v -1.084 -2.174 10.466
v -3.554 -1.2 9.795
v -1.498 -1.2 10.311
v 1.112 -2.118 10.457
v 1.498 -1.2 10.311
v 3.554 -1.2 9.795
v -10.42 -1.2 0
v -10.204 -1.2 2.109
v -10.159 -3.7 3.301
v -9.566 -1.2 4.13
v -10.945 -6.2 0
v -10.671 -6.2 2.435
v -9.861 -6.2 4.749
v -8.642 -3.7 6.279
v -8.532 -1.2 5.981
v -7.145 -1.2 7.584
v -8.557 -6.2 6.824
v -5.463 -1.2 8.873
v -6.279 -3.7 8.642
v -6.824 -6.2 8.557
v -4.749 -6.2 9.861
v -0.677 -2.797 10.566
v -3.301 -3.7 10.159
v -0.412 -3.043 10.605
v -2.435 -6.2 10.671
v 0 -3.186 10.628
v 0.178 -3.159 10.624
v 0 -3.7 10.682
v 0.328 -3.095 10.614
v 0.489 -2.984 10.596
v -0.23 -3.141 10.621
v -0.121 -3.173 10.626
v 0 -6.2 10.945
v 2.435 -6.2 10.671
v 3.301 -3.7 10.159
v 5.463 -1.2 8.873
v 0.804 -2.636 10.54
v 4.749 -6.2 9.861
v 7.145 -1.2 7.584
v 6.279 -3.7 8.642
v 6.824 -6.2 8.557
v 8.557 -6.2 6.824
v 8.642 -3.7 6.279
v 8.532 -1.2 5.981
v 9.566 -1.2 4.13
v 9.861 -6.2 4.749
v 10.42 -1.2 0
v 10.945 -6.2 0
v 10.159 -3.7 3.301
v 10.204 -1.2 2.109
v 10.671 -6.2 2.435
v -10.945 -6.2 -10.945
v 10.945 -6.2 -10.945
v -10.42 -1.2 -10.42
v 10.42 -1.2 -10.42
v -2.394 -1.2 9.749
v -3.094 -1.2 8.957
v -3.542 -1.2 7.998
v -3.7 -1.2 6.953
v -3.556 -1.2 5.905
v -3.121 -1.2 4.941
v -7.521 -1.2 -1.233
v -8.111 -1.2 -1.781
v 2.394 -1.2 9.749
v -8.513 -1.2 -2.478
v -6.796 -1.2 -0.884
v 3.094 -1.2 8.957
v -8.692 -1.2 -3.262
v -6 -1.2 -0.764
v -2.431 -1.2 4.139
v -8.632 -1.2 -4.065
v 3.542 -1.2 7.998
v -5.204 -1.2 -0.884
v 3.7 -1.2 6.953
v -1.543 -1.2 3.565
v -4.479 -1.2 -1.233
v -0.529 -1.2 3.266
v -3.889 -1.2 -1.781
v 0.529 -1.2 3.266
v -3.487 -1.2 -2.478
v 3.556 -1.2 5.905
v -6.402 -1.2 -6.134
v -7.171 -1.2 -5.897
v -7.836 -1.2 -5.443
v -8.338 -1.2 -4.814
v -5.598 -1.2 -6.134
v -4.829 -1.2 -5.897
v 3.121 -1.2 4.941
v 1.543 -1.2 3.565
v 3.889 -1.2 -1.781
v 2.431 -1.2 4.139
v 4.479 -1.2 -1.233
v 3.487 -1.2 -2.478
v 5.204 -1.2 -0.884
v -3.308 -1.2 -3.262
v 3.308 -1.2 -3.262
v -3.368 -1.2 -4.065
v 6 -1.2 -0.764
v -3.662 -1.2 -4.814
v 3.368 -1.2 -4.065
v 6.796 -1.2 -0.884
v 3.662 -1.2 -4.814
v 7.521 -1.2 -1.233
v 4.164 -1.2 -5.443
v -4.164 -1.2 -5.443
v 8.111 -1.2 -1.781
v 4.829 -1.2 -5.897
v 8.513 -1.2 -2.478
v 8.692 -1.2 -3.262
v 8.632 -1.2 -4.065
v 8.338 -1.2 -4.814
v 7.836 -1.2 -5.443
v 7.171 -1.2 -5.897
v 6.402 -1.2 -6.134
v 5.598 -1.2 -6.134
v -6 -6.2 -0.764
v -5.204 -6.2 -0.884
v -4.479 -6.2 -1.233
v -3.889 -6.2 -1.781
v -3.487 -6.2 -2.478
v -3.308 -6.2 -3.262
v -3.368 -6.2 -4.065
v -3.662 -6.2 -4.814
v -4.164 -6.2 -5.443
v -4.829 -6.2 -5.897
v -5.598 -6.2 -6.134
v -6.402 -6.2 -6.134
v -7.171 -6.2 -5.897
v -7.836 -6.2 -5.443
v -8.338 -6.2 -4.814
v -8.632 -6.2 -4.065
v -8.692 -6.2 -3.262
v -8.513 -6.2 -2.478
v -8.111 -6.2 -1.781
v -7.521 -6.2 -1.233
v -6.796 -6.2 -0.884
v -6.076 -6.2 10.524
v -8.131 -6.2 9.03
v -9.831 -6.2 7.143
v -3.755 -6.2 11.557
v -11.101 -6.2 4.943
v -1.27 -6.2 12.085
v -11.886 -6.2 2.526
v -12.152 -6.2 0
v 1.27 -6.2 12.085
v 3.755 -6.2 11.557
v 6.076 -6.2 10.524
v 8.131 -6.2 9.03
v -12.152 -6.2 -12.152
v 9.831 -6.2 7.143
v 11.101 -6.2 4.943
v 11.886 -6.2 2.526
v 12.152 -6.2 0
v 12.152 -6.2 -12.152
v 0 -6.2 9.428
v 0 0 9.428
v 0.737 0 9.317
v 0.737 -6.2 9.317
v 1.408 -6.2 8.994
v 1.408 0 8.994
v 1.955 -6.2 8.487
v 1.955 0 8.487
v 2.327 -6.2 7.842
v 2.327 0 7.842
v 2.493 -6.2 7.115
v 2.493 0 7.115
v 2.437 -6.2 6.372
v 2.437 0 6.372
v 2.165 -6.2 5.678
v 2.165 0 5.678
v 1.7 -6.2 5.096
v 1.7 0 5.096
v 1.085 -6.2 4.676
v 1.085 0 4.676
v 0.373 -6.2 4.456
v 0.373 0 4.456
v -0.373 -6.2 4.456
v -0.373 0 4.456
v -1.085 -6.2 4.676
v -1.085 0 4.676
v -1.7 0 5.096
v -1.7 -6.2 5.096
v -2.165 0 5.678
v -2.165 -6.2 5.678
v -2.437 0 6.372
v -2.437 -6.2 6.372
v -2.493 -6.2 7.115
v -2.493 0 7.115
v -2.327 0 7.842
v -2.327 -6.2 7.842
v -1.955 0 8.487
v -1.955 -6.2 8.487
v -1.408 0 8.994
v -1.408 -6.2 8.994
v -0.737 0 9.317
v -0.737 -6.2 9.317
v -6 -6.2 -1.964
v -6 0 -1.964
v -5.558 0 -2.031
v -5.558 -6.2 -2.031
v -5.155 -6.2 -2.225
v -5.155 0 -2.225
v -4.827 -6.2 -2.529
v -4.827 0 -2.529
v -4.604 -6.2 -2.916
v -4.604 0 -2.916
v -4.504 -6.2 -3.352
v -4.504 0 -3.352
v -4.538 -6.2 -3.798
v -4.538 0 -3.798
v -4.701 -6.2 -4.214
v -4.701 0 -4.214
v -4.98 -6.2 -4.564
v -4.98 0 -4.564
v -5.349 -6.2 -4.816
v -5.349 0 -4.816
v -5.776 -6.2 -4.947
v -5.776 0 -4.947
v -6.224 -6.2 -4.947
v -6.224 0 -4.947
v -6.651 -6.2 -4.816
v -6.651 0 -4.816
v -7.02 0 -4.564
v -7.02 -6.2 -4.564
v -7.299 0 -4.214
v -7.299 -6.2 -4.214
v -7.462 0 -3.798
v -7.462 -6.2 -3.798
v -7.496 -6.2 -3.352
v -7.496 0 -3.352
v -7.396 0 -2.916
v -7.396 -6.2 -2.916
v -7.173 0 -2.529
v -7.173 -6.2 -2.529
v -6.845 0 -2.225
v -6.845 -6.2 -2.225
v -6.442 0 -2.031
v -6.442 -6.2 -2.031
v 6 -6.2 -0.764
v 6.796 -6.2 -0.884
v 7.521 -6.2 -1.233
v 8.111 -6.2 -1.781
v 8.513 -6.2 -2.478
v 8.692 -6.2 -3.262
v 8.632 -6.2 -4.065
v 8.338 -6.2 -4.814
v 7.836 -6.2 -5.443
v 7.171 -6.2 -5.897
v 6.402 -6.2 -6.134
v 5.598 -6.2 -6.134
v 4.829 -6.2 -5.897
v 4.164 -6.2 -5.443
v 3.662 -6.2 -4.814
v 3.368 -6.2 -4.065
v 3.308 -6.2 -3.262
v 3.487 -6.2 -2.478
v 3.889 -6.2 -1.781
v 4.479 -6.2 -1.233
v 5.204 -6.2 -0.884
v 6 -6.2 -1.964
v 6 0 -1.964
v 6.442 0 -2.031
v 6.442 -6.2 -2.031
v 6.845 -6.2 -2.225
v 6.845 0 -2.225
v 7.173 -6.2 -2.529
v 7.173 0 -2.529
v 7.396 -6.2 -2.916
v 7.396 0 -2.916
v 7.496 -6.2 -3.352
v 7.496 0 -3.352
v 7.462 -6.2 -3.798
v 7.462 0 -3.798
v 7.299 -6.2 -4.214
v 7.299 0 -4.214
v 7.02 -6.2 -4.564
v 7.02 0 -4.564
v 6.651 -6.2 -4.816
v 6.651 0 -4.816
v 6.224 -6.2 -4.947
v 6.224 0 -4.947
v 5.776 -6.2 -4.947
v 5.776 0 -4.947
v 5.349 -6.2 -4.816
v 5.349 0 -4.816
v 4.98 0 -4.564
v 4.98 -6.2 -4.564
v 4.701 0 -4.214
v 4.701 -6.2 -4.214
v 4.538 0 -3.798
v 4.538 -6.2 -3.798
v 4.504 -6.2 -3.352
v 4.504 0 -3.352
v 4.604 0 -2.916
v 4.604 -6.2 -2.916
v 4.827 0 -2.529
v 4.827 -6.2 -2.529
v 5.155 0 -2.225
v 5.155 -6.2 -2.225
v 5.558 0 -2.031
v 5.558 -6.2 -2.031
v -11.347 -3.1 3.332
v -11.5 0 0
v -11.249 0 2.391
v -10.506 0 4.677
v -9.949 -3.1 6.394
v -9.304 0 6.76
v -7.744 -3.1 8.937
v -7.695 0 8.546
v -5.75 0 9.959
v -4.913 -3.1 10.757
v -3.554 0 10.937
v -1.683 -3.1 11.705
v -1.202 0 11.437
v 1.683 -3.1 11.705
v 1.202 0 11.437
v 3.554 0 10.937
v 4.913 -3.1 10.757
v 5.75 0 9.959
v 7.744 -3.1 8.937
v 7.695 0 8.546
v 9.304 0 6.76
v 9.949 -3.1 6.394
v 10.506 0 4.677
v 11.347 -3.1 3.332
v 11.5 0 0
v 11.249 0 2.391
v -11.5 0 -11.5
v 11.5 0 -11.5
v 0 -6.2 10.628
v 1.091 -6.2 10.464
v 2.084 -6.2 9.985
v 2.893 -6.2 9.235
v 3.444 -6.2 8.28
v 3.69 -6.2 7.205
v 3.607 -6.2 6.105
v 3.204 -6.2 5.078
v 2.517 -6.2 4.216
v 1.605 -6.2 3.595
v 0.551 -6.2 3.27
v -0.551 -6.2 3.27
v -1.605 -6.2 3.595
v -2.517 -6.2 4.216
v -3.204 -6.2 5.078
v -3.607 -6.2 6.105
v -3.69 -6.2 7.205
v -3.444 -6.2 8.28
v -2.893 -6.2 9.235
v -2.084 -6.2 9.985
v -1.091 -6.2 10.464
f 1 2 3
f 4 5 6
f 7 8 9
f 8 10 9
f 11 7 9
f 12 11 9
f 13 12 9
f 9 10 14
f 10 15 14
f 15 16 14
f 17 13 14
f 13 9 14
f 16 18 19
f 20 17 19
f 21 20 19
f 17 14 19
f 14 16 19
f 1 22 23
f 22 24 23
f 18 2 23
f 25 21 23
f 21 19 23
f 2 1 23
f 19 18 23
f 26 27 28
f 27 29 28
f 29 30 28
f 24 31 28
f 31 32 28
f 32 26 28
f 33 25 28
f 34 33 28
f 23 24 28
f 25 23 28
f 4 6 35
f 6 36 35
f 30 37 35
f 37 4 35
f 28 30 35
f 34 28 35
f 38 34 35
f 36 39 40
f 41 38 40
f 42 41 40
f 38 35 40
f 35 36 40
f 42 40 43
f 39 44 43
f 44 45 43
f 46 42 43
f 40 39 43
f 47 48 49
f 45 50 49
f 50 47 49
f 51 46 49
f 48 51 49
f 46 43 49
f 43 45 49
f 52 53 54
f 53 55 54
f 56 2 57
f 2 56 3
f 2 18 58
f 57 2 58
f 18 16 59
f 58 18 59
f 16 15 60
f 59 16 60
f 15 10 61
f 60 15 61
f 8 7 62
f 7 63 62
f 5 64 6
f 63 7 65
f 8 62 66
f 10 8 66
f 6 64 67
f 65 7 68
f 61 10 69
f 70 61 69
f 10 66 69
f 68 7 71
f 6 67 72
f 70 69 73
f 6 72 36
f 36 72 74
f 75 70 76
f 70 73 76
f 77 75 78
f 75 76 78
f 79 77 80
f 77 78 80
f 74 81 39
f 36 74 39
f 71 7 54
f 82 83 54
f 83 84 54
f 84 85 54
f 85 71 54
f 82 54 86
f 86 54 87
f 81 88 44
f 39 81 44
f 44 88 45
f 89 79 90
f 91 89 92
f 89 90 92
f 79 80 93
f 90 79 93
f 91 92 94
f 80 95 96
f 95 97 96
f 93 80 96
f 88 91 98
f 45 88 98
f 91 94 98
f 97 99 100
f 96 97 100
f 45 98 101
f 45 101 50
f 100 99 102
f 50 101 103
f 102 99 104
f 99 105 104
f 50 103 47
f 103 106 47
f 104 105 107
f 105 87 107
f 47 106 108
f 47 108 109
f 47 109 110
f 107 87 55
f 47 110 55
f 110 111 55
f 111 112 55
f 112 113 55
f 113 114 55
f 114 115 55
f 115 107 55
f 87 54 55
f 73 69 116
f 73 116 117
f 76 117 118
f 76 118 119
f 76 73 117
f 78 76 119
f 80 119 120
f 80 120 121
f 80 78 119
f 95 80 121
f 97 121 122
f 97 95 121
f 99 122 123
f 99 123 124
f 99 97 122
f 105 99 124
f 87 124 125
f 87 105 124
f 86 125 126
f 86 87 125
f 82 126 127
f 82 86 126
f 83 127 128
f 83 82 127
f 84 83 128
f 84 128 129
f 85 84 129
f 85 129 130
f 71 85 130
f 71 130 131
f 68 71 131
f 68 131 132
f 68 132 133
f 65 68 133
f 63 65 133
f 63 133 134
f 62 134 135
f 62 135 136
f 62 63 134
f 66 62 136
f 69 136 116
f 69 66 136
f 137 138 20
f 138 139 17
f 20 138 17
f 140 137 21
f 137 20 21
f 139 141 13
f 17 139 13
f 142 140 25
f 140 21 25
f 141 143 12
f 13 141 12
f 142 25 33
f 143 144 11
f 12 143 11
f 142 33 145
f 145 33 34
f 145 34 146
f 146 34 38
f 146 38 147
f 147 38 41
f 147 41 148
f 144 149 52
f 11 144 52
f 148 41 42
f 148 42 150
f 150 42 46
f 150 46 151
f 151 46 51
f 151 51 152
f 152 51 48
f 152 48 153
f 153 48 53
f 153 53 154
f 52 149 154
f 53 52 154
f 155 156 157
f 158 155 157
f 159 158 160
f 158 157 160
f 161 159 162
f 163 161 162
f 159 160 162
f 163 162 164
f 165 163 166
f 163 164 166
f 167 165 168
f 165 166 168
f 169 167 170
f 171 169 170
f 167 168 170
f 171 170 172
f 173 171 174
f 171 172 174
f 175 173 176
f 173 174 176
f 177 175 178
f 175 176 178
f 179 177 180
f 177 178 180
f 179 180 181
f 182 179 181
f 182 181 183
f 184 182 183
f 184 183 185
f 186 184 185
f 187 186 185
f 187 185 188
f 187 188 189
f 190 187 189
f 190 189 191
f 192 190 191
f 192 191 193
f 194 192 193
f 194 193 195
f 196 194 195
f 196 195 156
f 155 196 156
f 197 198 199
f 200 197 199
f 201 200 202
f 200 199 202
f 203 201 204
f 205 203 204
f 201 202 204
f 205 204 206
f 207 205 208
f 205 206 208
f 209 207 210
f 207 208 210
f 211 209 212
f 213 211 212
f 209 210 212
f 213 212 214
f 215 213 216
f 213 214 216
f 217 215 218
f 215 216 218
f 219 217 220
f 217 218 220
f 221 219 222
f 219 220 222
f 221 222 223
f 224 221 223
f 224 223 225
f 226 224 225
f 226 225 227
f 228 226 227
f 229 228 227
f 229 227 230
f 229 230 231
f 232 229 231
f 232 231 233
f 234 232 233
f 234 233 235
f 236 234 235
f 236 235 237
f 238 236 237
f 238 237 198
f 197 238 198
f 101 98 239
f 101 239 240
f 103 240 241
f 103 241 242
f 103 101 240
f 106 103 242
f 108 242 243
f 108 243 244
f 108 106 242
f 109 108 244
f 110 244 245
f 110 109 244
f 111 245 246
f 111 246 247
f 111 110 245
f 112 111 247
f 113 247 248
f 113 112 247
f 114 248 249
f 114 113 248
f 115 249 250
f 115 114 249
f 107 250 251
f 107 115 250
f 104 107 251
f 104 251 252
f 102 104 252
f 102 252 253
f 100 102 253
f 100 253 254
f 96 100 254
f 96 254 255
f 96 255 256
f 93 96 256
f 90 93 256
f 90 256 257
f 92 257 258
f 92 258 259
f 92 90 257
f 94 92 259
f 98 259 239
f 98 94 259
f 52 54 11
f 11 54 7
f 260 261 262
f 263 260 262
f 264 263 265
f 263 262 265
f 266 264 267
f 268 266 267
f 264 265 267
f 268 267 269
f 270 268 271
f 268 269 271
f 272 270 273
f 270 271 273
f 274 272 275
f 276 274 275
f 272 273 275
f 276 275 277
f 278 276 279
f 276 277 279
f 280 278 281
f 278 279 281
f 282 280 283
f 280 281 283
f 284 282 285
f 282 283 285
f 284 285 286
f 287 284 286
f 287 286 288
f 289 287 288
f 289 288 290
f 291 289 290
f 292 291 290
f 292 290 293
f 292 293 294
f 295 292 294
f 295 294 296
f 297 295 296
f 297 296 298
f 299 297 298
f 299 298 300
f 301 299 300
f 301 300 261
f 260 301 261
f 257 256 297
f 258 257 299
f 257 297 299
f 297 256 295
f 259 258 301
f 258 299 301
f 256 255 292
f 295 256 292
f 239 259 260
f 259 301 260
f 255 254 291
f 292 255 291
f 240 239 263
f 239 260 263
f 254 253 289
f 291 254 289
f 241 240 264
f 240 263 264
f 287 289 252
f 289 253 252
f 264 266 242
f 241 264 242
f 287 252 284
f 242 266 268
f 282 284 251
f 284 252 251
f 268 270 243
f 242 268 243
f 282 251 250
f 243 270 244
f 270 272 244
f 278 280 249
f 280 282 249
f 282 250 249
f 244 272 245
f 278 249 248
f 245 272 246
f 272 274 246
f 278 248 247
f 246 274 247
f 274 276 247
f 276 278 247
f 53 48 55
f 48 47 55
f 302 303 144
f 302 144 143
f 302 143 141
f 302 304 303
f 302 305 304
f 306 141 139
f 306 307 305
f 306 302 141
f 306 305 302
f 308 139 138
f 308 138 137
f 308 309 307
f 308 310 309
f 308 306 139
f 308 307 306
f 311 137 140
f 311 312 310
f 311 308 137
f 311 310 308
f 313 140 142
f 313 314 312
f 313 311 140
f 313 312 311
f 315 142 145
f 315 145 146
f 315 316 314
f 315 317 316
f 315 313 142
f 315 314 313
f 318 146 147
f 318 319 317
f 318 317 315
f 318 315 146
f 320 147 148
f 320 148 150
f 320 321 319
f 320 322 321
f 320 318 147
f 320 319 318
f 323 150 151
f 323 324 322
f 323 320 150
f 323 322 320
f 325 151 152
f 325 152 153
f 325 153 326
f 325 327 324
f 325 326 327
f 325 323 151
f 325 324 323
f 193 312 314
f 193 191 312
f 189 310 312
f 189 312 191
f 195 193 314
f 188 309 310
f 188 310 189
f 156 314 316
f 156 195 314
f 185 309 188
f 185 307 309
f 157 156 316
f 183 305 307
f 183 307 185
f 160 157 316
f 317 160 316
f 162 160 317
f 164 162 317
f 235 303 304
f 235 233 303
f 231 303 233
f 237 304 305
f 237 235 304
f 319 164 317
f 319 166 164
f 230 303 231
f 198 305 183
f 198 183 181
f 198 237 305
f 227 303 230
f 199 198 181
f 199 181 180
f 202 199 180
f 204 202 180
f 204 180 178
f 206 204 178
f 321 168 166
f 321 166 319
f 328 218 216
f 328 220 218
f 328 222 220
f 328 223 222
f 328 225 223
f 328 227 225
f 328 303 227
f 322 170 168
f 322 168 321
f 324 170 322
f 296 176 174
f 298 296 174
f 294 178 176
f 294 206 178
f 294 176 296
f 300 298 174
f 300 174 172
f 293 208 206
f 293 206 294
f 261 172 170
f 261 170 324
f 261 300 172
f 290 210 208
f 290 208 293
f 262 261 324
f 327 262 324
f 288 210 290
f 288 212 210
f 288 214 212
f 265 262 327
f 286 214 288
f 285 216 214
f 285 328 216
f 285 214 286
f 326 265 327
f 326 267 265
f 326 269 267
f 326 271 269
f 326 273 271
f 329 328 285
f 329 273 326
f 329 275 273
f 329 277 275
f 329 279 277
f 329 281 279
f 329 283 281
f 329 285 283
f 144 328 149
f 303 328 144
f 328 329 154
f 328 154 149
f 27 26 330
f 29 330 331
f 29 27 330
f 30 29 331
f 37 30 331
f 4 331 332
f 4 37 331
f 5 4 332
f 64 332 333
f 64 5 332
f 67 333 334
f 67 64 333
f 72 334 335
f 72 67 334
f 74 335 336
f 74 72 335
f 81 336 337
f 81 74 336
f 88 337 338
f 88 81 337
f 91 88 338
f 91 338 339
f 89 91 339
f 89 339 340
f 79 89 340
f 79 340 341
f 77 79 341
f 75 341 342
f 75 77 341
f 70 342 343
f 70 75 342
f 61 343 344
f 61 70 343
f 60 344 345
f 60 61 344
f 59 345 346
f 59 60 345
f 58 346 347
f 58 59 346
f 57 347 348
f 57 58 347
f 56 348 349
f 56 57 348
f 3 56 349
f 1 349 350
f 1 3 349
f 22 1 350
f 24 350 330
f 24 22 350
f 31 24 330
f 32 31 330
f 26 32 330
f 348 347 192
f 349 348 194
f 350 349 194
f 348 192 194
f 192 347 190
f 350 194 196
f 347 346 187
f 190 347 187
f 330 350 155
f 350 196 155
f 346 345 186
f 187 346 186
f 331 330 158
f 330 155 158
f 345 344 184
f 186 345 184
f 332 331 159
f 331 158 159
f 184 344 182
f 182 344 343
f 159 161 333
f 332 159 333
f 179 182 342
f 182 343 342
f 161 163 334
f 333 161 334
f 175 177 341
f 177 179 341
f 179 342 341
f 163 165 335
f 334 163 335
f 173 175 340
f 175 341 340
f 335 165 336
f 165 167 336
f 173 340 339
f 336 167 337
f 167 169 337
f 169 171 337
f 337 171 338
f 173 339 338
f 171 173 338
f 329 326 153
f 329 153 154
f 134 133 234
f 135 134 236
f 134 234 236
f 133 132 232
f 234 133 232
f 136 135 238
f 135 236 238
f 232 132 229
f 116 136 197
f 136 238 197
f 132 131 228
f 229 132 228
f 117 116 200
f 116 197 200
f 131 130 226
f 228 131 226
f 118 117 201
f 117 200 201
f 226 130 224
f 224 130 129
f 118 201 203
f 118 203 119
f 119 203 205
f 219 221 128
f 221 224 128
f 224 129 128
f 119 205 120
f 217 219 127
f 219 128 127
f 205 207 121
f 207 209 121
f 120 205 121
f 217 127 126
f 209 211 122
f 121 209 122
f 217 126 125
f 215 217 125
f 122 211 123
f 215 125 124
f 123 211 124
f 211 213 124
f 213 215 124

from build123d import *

# Parameters (mm, degrees)
BOSS_EXTRUDE1_DEPTH = 6.2
BOSS_EXTRUDE1_DRAFT = 6
SKETCH2_R           = 1.5
SKETCH2_R_2         = 2.5
CUT_EXTRUDE1_DEPTH  = 19.269236809
SHELL1_T            = -1.2


with BuildPart() as part:
    # Sketch1 → Boss-Extrude1 (with draft: the straight prism first)
    with BuildSketch(Plane(origin=(0, 0, 0), x_dir=(1, 0, 0), z_dir=(0, 1, 0))):
        with BuildLine():
            Line((-11.5, 11.5), (-11.5, 0))
            ThreePointArc((-11.5, 0), (0, -11.5), (11.5, 0))
            Line((11.5, 0), (11.5, 11.5))
            Line((11.5, 11.5), (-11.5, 11.5))
        make_face()
    extrude(amount=-BOSS_EXTRUDE1_DEPTH)
    # Boss-Extrude1: the draft: its side faces are tilted about the plane it starts from
    boss_extrude1_sides = [part.faces().sort_by_distance(p)[0] for p in [
        (11.5, -3.1, -5.75),
        (0, -3.1, -11.5),
        (-11.5, -3.1, -5.75),
        (0, -3.1, 11.5),
    ]]
    draft(boss_extrude1_sides, Plane(origin=(0, 0, 0), x_dir=(1, 0, 0), z_dir=(0, 1, 0)), BOSS_EXTRUDE1_DRAFT)

    # Sketch2 → Cut-Extrude1 (cut, through all)
    with BuildSketch(Plane(origin=(0, 0, 0), x_dir=(1, 0, 0), z_dir=(0, 1, 0))):
        with Locations(Location((-6, 3.464101615, 0), (0, 0, 270))):
            Circle(SKETCH2_R)
        with Locations(Location((6, 3.464101615, 0), (0, 0, 270))):
            Circle(SKETCH2_R)
        with Locations(Location((0, -6.92820323, 0), (0, 0, 270))):
            Circle(SKETCH2_R_2)
    extrude(amount=-CUT_EXTRUDE1_DEPTH, mode=Mode.SUBTRACT)

    # Shell1
    shell1_openings = [part.faces().sort_by_distance(p)[0] for p in [
        (0, -6.2, -1.388400602),
    ]]
    offset(amount=SHELL1_T, openings=shell1_openings)


solid = part.part
